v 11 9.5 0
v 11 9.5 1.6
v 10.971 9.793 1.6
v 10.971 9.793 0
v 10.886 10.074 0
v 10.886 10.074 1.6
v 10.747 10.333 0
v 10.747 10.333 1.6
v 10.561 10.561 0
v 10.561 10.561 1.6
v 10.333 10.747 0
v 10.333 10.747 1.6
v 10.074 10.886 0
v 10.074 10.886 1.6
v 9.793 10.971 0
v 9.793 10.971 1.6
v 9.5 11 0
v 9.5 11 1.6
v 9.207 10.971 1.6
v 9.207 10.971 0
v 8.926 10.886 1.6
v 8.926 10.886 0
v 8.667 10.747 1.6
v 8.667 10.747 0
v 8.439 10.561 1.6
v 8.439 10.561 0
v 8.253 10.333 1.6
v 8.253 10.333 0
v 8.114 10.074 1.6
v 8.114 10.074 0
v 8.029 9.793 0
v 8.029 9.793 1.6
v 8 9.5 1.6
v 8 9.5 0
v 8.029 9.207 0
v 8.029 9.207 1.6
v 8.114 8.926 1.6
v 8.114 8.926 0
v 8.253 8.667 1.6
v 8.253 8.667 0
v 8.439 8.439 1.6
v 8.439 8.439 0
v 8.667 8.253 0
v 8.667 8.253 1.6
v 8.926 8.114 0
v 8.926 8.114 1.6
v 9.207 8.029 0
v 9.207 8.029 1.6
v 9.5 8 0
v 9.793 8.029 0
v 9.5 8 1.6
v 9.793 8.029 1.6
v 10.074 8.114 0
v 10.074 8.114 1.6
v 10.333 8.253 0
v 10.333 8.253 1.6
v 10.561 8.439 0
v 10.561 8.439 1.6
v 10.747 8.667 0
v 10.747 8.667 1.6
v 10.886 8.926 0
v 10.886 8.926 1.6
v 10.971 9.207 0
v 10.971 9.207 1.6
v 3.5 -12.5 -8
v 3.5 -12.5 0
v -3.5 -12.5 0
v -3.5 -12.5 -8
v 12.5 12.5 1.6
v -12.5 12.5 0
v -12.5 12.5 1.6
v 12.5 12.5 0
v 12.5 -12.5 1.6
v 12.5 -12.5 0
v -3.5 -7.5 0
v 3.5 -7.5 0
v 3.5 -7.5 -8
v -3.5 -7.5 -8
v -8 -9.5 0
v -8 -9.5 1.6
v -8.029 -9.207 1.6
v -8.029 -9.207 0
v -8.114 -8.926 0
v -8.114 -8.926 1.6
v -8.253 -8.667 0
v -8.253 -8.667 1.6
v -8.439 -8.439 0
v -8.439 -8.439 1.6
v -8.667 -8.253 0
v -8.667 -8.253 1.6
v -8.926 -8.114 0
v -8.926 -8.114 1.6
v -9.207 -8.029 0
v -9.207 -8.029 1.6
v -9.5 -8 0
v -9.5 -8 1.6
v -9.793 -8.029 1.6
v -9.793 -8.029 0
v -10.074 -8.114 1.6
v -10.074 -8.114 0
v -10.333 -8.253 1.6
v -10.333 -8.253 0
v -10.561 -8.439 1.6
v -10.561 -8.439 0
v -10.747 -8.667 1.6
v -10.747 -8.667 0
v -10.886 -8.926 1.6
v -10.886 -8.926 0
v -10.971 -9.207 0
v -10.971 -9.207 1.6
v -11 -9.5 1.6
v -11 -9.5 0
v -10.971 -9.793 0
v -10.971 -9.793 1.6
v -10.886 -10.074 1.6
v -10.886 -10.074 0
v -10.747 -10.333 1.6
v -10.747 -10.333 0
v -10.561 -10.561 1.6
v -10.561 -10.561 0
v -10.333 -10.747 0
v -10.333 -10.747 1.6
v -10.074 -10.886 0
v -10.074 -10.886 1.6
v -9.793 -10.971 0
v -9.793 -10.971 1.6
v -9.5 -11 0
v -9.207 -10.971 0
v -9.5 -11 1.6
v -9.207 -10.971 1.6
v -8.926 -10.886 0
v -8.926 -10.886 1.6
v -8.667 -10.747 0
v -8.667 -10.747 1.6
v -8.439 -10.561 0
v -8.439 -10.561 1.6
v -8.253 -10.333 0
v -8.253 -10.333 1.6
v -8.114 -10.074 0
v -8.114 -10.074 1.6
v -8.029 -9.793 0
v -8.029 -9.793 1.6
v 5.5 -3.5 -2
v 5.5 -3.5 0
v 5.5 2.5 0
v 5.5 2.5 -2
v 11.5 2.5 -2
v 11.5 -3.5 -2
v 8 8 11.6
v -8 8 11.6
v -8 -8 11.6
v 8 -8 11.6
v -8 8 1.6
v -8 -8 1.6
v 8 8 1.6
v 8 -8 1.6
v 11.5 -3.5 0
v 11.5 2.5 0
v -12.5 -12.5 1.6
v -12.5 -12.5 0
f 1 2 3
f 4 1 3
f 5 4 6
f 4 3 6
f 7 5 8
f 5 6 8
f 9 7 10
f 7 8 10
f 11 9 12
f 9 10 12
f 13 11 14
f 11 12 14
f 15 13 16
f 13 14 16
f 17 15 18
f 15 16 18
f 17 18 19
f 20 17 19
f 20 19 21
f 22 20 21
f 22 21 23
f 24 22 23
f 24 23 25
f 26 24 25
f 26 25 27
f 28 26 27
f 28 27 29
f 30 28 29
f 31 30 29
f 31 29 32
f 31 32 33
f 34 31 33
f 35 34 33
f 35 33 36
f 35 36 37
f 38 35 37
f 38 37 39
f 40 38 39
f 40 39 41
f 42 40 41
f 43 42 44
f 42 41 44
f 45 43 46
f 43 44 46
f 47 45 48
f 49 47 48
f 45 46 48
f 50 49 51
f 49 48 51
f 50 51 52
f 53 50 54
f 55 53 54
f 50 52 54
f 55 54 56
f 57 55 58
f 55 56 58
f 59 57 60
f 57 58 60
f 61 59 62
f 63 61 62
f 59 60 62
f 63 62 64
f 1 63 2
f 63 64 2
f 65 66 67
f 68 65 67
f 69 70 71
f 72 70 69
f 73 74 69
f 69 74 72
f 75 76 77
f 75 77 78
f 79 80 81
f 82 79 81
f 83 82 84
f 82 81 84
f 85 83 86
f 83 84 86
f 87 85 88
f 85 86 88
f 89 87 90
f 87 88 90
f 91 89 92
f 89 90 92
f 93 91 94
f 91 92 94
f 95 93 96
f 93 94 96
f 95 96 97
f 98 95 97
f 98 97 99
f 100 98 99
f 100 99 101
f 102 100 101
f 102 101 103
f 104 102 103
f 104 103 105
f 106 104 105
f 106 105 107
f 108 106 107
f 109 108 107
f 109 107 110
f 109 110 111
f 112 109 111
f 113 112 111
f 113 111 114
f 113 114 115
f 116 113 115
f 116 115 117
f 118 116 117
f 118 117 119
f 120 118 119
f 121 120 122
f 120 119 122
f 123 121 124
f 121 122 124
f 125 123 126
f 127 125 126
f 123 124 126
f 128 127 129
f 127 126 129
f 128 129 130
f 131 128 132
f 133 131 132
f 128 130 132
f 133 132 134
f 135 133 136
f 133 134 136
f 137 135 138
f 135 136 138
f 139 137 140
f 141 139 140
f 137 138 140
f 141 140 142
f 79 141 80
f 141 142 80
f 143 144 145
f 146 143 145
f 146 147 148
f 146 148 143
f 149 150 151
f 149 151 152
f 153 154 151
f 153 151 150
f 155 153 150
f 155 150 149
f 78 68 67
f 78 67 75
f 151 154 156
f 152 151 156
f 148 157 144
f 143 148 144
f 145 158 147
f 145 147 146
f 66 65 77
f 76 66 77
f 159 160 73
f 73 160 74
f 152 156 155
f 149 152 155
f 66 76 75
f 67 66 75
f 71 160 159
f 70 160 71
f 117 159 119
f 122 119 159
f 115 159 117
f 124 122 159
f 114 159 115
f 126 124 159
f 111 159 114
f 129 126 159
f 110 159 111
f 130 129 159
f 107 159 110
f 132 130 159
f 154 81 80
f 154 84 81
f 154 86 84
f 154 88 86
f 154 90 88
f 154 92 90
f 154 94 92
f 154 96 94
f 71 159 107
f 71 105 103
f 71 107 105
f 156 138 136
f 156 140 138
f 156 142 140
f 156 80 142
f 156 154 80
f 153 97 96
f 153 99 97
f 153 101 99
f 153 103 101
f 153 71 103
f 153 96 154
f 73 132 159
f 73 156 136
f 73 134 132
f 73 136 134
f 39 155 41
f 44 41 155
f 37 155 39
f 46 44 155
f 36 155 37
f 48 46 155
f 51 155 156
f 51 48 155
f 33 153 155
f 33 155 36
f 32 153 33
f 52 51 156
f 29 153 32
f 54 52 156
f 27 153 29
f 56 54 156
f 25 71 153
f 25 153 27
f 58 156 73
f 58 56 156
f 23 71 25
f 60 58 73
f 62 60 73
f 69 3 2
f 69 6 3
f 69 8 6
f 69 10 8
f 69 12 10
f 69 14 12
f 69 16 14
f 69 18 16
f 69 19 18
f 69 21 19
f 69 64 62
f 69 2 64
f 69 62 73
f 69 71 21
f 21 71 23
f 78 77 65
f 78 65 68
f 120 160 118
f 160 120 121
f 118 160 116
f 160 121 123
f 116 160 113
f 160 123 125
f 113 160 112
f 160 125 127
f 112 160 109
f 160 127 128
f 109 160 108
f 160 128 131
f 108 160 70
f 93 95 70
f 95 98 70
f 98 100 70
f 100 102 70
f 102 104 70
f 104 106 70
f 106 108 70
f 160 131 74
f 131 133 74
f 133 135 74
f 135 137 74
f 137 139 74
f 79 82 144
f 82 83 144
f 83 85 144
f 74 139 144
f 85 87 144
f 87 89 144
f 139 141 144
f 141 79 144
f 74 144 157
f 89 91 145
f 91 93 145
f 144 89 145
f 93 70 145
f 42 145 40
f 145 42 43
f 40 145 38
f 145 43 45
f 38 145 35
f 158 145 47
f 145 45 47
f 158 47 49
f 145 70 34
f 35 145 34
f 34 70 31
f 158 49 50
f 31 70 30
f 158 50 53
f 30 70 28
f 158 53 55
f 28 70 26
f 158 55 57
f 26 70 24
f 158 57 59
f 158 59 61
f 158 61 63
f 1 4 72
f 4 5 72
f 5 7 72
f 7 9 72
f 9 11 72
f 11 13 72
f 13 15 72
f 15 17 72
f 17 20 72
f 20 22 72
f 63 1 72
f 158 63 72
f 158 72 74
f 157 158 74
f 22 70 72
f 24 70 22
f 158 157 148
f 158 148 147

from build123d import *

# Parameters (mm, degrees)
SKETCH1_W           = 25
SKETCH1_H           = 25
BOSS_EXTRUDE1_DEPTH = 1.6
SKETCH2_R           = 1.5
CUT_EXTRUDE1_DEPTH  = 18.749929577
SKETCH3_W           = 16
SKETCH3_H           = 16
BOSS_EXTRUDE2_DEPTH = 10
SKETCH4_W           = 7
SKETCH4_H           = 5
BOSS_EXTRUDE3_DEPTH = 8
SKETCH5_W           = 6
SKETCH5_H           = 6
BOSS_EXTRUDE4_DEPTH = 2


with BuildPart() as part:
    # Sketch1 → Boss-Extrude1 (new body)
    with BuildSketch(Plane.XY):
        Rectangle(SKETCH1_W, SKETCH1_H)
    extrude(amount=BOSS_EXTRUDE1_DEPTH)

    # Sketch2 → Cut-Extrude1 (cut, through all)
    with BuildSketch(Plane.XY.offset(1.6)):
        with Locations((9.5, 9.5)):
            Circle(SKETCH2_R)
        with Locations((-9.5, -9.5)):
            Circle(SKETCH2_R)
    extrude(amount=-CUT_EXTRUDE1_DEPTH, mode=Mode.SUBTRACT)

    # Sketch3 → Boss-Extrude2 (add)
    with BuildSketch(Plane.XY.offset(1.6)):
        Rectangle(SKETCH3_W, SKETCH3_H)
    extrude(amount=BOSS_EXTRUDE2_DEPTH)

    # Sketch5 → Boss-Extrude4 (add)
    with BuildSketch(Plane(origin=(0, 0, 0), x_dir=(-1, 0, 0), z_dir=(0, 0, -1))):
        with Locations((-8.5, -0.5)):
            Rectangle(SKETCH5_W, SKETCH5_H)
    extrude(amount=BOSS_EXTRUDE4_DEPTH)


with BuildPart() as body_2:
    # Sketch4 → Boss-Extrude3 (new body)
    with BuildSketch(Plane(origin=(0, 0, 0), x_dir=(-1, 0, 0), z_dir=(0, 0, -1))):
        with Locations((0, -10)):
            Rectangle(SKETCH4_W, SKETCH4_H)
    extrude(amount=BOSS_EXTRUDE3_DEPTH)


solid = Compound([part.part, body_2.part])
